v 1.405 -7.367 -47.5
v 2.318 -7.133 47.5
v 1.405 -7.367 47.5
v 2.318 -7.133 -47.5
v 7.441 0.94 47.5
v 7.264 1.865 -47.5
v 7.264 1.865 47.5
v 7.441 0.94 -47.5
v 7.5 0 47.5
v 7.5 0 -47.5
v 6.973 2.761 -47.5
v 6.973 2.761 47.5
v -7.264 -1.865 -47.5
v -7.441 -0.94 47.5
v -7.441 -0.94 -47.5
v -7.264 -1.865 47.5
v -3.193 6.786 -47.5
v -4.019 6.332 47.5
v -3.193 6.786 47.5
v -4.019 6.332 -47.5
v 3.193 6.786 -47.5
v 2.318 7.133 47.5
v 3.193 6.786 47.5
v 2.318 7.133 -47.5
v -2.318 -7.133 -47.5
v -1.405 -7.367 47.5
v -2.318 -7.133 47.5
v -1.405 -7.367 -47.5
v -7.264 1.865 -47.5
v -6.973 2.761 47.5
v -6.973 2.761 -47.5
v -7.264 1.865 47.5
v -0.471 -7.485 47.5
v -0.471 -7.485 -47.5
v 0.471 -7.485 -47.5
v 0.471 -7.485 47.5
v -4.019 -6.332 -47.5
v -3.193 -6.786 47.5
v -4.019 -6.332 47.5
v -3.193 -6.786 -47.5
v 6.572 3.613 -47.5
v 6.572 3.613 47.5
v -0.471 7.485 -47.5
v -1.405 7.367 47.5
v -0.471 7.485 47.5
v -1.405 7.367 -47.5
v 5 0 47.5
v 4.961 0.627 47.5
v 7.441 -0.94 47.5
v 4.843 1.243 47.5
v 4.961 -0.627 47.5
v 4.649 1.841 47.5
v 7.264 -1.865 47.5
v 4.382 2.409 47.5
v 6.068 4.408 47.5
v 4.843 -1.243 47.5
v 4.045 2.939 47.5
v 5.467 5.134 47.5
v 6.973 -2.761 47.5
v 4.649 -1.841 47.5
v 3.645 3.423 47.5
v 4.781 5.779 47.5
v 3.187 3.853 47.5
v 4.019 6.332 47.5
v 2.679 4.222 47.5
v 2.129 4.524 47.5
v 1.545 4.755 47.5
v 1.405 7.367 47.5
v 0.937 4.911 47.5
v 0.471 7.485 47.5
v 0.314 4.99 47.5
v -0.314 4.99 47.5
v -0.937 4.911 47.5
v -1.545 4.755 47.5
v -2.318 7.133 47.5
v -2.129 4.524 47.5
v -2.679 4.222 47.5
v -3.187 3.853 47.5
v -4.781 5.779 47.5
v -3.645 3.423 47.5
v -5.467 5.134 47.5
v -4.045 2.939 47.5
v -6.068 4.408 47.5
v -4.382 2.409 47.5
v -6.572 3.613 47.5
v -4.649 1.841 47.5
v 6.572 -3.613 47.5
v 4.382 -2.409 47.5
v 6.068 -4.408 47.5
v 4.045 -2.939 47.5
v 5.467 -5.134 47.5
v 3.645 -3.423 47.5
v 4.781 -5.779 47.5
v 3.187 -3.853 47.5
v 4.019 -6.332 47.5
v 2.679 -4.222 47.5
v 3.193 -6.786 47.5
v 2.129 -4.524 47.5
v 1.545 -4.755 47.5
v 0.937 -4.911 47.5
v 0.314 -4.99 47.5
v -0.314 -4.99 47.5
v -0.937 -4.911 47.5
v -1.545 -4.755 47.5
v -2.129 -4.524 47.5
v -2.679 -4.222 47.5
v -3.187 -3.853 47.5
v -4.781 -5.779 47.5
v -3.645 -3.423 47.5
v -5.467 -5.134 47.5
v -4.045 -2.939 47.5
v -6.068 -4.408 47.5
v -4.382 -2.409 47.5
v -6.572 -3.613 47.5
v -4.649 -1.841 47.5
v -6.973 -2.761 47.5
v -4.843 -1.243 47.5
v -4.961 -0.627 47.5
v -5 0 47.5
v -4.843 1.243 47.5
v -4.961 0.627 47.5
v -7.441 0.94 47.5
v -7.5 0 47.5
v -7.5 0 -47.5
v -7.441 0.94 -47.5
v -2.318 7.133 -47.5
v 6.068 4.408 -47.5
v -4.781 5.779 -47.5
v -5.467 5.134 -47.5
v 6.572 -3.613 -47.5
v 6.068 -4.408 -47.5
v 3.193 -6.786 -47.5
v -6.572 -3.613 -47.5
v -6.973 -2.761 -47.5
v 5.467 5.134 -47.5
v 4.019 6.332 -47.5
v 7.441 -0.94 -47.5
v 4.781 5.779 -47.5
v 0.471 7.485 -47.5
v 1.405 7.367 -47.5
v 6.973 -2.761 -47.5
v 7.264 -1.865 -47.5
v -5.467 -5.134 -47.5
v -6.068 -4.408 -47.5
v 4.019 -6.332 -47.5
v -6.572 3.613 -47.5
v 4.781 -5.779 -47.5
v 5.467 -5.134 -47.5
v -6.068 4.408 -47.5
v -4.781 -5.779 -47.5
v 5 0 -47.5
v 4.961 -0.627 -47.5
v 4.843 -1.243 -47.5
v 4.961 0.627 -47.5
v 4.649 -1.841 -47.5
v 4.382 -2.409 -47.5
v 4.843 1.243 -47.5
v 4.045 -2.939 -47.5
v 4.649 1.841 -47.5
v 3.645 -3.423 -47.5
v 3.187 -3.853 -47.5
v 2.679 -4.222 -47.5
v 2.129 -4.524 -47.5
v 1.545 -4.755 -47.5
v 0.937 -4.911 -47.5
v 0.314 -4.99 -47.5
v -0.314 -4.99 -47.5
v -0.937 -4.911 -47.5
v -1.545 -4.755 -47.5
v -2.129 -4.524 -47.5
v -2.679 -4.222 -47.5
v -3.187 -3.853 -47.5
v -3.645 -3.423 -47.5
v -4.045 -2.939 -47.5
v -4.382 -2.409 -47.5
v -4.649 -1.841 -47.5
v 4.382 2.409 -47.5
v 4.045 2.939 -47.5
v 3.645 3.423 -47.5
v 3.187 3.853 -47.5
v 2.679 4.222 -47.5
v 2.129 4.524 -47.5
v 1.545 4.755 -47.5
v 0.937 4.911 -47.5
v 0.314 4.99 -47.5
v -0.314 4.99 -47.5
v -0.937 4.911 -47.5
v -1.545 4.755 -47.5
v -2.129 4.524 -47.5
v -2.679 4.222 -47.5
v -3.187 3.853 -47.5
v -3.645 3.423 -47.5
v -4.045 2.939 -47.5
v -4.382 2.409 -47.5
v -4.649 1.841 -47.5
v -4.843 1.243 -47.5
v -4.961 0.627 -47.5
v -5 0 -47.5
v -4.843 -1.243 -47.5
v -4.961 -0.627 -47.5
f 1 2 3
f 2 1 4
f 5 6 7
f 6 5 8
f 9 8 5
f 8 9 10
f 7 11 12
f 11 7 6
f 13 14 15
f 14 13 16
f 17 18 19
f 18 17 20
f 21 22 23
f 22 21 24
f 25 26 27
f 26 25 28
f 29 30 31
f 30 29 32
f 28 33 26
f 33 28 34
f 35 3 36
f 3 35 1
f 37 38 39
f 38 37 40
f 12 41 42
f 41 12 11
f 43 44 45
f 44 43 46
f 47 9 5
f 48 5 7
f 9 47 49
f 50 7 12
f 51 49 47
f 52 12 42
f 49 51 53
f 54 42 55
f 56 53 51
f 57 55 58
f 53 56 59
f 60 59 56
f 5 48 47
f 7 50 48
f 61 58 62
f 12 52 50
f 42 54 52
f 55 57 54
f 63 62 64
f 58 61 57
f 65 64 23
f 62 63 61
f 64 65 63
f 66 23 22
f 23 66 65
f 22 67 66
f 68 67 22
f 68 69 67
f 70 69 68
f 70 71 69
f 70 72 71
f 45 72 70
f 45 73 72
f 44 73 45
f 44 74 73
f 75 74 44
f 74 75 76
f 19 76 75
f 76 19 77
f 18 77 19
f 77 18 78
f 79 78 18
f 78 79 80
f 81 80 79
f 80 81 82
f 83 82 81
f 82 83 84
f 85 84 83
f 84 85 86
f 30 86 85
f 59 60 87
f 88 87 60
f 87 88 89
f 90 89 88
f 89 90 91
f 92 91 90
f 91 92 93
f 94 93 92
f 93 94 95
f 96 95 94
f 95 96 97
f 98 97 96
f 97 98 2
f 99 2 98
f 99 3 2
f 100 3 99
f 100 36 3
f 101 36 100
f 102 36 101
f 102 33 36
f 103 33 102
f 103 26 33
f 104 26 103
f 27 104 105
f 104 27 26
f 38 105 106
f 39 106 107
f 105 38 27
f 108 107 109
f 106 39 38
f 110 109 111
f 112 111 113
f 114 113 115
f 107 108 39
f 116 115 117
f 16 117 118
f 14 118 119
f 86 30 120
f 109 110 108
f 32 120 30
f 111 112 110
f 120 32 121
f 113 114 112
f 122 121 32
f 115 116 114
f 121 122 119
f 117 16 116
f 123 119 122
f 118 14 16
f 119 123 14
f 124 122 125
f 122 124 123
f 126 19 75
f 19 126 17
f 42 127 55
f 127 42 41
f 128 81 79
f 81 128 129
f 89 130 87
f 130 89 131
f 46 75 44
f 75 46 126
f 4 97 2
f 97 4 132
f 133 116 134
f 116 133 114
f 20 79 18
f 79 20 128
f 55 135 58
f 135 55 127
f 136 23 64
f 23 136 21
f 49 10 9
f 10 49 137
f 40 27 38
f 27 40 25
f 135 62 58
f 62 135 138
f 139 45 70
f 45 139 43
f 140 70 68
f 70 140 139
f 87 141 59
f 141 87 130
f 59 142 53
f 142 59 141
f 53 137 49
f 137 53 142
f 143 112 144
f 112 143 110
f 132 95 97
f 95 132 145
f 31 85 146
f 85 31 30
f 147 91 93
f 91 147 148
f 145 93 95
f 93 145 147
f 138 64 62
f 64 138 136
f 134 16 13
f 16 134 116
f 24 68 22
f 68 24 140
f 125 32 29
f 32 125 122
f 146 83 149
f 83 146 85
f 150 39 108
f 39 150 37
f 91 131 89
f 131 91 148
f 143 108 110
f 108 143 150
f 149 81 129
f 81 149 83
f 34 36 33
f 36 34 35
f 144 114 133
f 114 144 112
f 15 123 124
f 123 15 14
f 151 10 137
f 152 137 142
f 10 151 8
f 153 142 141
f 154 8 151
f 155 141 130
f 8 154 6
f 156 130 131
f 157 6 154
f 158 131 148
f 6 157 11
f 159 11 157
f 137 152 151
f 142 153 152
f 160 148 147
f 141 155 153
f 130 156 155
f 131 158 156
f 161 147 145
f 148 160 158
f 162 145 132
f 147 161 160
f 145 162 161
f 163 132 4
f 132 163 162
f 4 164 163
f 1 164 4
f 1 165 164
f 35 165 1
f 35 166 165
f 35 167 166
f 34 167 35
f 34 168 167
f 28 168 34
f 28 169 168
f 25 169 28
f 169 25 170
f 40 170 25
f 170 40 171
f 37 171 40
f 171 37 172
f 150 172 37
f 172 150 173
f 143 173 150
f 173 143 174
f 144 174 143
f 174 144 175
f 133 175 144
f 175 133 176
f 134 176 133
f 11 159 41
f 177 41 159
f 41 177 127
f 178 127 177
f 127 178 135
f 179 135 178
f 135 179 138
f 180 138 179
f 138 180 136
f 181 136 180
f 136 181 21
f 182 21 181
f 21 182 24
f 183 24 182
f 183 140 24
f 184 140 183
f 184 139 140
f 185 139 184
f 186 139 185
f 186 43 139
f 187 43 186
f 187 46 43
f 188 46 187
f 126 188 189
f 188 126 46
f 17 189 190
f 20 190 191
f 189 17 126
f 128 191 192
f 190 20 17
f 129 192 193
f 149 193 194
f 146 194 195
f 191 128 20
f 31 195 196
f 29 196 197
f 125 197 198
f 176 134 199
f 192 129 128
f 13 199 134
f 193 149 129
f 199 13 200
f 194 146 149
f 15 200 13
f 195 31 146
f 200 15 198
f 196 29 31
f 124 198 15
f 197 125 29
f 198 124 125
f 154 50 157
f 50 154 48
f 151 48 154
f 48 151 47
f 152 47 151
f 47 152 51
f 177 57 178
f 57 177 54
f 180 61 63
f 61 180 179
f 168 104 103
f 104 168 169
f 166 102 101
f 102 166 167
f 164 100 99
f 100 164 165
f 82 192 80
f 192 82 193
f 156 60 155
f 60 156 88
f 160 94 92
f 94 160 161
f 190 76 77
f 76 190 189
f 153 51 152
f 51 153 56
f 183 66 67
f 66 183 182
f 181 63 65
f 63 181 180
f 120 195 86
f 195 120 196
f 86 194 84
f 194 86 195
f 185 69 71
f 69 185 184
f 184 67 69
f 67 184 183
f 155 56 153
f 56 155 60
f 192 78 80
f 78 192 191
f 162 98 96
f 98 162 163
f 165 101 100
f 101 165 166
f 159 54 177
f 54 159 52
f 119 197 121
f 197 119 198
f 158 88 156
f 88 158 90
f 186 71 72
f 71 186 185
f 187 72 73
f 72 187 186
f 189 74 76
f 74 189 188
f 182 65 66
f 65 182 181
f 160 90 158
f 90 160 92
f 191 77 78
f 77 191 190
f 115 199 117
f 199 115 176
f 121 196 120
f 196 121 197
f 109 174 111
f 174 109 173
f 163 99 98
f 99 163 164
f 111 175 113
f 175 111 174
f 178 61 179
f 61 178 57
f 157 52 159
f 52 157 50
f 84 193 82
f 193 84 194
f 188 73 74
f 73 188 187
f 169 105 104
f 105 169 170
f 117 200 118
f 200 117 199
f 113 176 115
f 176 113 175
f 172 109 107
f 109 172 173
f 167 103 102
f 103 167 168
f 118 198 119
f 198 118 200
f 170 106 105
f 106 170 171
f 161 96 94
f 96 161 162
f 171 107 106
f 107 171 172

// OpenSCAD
$fn = 50;


difference() {
	union() {
		translate(v = [0, 0, -47.5000000000]) {
			cylinder(h = 95, r = 7.5000000000);
		}
	}
	union() {
		translate(v = [0, 0, -100.0000000000]) {
			cylinder(h = 200, r = 5.0000000000);
		}
	}
}
